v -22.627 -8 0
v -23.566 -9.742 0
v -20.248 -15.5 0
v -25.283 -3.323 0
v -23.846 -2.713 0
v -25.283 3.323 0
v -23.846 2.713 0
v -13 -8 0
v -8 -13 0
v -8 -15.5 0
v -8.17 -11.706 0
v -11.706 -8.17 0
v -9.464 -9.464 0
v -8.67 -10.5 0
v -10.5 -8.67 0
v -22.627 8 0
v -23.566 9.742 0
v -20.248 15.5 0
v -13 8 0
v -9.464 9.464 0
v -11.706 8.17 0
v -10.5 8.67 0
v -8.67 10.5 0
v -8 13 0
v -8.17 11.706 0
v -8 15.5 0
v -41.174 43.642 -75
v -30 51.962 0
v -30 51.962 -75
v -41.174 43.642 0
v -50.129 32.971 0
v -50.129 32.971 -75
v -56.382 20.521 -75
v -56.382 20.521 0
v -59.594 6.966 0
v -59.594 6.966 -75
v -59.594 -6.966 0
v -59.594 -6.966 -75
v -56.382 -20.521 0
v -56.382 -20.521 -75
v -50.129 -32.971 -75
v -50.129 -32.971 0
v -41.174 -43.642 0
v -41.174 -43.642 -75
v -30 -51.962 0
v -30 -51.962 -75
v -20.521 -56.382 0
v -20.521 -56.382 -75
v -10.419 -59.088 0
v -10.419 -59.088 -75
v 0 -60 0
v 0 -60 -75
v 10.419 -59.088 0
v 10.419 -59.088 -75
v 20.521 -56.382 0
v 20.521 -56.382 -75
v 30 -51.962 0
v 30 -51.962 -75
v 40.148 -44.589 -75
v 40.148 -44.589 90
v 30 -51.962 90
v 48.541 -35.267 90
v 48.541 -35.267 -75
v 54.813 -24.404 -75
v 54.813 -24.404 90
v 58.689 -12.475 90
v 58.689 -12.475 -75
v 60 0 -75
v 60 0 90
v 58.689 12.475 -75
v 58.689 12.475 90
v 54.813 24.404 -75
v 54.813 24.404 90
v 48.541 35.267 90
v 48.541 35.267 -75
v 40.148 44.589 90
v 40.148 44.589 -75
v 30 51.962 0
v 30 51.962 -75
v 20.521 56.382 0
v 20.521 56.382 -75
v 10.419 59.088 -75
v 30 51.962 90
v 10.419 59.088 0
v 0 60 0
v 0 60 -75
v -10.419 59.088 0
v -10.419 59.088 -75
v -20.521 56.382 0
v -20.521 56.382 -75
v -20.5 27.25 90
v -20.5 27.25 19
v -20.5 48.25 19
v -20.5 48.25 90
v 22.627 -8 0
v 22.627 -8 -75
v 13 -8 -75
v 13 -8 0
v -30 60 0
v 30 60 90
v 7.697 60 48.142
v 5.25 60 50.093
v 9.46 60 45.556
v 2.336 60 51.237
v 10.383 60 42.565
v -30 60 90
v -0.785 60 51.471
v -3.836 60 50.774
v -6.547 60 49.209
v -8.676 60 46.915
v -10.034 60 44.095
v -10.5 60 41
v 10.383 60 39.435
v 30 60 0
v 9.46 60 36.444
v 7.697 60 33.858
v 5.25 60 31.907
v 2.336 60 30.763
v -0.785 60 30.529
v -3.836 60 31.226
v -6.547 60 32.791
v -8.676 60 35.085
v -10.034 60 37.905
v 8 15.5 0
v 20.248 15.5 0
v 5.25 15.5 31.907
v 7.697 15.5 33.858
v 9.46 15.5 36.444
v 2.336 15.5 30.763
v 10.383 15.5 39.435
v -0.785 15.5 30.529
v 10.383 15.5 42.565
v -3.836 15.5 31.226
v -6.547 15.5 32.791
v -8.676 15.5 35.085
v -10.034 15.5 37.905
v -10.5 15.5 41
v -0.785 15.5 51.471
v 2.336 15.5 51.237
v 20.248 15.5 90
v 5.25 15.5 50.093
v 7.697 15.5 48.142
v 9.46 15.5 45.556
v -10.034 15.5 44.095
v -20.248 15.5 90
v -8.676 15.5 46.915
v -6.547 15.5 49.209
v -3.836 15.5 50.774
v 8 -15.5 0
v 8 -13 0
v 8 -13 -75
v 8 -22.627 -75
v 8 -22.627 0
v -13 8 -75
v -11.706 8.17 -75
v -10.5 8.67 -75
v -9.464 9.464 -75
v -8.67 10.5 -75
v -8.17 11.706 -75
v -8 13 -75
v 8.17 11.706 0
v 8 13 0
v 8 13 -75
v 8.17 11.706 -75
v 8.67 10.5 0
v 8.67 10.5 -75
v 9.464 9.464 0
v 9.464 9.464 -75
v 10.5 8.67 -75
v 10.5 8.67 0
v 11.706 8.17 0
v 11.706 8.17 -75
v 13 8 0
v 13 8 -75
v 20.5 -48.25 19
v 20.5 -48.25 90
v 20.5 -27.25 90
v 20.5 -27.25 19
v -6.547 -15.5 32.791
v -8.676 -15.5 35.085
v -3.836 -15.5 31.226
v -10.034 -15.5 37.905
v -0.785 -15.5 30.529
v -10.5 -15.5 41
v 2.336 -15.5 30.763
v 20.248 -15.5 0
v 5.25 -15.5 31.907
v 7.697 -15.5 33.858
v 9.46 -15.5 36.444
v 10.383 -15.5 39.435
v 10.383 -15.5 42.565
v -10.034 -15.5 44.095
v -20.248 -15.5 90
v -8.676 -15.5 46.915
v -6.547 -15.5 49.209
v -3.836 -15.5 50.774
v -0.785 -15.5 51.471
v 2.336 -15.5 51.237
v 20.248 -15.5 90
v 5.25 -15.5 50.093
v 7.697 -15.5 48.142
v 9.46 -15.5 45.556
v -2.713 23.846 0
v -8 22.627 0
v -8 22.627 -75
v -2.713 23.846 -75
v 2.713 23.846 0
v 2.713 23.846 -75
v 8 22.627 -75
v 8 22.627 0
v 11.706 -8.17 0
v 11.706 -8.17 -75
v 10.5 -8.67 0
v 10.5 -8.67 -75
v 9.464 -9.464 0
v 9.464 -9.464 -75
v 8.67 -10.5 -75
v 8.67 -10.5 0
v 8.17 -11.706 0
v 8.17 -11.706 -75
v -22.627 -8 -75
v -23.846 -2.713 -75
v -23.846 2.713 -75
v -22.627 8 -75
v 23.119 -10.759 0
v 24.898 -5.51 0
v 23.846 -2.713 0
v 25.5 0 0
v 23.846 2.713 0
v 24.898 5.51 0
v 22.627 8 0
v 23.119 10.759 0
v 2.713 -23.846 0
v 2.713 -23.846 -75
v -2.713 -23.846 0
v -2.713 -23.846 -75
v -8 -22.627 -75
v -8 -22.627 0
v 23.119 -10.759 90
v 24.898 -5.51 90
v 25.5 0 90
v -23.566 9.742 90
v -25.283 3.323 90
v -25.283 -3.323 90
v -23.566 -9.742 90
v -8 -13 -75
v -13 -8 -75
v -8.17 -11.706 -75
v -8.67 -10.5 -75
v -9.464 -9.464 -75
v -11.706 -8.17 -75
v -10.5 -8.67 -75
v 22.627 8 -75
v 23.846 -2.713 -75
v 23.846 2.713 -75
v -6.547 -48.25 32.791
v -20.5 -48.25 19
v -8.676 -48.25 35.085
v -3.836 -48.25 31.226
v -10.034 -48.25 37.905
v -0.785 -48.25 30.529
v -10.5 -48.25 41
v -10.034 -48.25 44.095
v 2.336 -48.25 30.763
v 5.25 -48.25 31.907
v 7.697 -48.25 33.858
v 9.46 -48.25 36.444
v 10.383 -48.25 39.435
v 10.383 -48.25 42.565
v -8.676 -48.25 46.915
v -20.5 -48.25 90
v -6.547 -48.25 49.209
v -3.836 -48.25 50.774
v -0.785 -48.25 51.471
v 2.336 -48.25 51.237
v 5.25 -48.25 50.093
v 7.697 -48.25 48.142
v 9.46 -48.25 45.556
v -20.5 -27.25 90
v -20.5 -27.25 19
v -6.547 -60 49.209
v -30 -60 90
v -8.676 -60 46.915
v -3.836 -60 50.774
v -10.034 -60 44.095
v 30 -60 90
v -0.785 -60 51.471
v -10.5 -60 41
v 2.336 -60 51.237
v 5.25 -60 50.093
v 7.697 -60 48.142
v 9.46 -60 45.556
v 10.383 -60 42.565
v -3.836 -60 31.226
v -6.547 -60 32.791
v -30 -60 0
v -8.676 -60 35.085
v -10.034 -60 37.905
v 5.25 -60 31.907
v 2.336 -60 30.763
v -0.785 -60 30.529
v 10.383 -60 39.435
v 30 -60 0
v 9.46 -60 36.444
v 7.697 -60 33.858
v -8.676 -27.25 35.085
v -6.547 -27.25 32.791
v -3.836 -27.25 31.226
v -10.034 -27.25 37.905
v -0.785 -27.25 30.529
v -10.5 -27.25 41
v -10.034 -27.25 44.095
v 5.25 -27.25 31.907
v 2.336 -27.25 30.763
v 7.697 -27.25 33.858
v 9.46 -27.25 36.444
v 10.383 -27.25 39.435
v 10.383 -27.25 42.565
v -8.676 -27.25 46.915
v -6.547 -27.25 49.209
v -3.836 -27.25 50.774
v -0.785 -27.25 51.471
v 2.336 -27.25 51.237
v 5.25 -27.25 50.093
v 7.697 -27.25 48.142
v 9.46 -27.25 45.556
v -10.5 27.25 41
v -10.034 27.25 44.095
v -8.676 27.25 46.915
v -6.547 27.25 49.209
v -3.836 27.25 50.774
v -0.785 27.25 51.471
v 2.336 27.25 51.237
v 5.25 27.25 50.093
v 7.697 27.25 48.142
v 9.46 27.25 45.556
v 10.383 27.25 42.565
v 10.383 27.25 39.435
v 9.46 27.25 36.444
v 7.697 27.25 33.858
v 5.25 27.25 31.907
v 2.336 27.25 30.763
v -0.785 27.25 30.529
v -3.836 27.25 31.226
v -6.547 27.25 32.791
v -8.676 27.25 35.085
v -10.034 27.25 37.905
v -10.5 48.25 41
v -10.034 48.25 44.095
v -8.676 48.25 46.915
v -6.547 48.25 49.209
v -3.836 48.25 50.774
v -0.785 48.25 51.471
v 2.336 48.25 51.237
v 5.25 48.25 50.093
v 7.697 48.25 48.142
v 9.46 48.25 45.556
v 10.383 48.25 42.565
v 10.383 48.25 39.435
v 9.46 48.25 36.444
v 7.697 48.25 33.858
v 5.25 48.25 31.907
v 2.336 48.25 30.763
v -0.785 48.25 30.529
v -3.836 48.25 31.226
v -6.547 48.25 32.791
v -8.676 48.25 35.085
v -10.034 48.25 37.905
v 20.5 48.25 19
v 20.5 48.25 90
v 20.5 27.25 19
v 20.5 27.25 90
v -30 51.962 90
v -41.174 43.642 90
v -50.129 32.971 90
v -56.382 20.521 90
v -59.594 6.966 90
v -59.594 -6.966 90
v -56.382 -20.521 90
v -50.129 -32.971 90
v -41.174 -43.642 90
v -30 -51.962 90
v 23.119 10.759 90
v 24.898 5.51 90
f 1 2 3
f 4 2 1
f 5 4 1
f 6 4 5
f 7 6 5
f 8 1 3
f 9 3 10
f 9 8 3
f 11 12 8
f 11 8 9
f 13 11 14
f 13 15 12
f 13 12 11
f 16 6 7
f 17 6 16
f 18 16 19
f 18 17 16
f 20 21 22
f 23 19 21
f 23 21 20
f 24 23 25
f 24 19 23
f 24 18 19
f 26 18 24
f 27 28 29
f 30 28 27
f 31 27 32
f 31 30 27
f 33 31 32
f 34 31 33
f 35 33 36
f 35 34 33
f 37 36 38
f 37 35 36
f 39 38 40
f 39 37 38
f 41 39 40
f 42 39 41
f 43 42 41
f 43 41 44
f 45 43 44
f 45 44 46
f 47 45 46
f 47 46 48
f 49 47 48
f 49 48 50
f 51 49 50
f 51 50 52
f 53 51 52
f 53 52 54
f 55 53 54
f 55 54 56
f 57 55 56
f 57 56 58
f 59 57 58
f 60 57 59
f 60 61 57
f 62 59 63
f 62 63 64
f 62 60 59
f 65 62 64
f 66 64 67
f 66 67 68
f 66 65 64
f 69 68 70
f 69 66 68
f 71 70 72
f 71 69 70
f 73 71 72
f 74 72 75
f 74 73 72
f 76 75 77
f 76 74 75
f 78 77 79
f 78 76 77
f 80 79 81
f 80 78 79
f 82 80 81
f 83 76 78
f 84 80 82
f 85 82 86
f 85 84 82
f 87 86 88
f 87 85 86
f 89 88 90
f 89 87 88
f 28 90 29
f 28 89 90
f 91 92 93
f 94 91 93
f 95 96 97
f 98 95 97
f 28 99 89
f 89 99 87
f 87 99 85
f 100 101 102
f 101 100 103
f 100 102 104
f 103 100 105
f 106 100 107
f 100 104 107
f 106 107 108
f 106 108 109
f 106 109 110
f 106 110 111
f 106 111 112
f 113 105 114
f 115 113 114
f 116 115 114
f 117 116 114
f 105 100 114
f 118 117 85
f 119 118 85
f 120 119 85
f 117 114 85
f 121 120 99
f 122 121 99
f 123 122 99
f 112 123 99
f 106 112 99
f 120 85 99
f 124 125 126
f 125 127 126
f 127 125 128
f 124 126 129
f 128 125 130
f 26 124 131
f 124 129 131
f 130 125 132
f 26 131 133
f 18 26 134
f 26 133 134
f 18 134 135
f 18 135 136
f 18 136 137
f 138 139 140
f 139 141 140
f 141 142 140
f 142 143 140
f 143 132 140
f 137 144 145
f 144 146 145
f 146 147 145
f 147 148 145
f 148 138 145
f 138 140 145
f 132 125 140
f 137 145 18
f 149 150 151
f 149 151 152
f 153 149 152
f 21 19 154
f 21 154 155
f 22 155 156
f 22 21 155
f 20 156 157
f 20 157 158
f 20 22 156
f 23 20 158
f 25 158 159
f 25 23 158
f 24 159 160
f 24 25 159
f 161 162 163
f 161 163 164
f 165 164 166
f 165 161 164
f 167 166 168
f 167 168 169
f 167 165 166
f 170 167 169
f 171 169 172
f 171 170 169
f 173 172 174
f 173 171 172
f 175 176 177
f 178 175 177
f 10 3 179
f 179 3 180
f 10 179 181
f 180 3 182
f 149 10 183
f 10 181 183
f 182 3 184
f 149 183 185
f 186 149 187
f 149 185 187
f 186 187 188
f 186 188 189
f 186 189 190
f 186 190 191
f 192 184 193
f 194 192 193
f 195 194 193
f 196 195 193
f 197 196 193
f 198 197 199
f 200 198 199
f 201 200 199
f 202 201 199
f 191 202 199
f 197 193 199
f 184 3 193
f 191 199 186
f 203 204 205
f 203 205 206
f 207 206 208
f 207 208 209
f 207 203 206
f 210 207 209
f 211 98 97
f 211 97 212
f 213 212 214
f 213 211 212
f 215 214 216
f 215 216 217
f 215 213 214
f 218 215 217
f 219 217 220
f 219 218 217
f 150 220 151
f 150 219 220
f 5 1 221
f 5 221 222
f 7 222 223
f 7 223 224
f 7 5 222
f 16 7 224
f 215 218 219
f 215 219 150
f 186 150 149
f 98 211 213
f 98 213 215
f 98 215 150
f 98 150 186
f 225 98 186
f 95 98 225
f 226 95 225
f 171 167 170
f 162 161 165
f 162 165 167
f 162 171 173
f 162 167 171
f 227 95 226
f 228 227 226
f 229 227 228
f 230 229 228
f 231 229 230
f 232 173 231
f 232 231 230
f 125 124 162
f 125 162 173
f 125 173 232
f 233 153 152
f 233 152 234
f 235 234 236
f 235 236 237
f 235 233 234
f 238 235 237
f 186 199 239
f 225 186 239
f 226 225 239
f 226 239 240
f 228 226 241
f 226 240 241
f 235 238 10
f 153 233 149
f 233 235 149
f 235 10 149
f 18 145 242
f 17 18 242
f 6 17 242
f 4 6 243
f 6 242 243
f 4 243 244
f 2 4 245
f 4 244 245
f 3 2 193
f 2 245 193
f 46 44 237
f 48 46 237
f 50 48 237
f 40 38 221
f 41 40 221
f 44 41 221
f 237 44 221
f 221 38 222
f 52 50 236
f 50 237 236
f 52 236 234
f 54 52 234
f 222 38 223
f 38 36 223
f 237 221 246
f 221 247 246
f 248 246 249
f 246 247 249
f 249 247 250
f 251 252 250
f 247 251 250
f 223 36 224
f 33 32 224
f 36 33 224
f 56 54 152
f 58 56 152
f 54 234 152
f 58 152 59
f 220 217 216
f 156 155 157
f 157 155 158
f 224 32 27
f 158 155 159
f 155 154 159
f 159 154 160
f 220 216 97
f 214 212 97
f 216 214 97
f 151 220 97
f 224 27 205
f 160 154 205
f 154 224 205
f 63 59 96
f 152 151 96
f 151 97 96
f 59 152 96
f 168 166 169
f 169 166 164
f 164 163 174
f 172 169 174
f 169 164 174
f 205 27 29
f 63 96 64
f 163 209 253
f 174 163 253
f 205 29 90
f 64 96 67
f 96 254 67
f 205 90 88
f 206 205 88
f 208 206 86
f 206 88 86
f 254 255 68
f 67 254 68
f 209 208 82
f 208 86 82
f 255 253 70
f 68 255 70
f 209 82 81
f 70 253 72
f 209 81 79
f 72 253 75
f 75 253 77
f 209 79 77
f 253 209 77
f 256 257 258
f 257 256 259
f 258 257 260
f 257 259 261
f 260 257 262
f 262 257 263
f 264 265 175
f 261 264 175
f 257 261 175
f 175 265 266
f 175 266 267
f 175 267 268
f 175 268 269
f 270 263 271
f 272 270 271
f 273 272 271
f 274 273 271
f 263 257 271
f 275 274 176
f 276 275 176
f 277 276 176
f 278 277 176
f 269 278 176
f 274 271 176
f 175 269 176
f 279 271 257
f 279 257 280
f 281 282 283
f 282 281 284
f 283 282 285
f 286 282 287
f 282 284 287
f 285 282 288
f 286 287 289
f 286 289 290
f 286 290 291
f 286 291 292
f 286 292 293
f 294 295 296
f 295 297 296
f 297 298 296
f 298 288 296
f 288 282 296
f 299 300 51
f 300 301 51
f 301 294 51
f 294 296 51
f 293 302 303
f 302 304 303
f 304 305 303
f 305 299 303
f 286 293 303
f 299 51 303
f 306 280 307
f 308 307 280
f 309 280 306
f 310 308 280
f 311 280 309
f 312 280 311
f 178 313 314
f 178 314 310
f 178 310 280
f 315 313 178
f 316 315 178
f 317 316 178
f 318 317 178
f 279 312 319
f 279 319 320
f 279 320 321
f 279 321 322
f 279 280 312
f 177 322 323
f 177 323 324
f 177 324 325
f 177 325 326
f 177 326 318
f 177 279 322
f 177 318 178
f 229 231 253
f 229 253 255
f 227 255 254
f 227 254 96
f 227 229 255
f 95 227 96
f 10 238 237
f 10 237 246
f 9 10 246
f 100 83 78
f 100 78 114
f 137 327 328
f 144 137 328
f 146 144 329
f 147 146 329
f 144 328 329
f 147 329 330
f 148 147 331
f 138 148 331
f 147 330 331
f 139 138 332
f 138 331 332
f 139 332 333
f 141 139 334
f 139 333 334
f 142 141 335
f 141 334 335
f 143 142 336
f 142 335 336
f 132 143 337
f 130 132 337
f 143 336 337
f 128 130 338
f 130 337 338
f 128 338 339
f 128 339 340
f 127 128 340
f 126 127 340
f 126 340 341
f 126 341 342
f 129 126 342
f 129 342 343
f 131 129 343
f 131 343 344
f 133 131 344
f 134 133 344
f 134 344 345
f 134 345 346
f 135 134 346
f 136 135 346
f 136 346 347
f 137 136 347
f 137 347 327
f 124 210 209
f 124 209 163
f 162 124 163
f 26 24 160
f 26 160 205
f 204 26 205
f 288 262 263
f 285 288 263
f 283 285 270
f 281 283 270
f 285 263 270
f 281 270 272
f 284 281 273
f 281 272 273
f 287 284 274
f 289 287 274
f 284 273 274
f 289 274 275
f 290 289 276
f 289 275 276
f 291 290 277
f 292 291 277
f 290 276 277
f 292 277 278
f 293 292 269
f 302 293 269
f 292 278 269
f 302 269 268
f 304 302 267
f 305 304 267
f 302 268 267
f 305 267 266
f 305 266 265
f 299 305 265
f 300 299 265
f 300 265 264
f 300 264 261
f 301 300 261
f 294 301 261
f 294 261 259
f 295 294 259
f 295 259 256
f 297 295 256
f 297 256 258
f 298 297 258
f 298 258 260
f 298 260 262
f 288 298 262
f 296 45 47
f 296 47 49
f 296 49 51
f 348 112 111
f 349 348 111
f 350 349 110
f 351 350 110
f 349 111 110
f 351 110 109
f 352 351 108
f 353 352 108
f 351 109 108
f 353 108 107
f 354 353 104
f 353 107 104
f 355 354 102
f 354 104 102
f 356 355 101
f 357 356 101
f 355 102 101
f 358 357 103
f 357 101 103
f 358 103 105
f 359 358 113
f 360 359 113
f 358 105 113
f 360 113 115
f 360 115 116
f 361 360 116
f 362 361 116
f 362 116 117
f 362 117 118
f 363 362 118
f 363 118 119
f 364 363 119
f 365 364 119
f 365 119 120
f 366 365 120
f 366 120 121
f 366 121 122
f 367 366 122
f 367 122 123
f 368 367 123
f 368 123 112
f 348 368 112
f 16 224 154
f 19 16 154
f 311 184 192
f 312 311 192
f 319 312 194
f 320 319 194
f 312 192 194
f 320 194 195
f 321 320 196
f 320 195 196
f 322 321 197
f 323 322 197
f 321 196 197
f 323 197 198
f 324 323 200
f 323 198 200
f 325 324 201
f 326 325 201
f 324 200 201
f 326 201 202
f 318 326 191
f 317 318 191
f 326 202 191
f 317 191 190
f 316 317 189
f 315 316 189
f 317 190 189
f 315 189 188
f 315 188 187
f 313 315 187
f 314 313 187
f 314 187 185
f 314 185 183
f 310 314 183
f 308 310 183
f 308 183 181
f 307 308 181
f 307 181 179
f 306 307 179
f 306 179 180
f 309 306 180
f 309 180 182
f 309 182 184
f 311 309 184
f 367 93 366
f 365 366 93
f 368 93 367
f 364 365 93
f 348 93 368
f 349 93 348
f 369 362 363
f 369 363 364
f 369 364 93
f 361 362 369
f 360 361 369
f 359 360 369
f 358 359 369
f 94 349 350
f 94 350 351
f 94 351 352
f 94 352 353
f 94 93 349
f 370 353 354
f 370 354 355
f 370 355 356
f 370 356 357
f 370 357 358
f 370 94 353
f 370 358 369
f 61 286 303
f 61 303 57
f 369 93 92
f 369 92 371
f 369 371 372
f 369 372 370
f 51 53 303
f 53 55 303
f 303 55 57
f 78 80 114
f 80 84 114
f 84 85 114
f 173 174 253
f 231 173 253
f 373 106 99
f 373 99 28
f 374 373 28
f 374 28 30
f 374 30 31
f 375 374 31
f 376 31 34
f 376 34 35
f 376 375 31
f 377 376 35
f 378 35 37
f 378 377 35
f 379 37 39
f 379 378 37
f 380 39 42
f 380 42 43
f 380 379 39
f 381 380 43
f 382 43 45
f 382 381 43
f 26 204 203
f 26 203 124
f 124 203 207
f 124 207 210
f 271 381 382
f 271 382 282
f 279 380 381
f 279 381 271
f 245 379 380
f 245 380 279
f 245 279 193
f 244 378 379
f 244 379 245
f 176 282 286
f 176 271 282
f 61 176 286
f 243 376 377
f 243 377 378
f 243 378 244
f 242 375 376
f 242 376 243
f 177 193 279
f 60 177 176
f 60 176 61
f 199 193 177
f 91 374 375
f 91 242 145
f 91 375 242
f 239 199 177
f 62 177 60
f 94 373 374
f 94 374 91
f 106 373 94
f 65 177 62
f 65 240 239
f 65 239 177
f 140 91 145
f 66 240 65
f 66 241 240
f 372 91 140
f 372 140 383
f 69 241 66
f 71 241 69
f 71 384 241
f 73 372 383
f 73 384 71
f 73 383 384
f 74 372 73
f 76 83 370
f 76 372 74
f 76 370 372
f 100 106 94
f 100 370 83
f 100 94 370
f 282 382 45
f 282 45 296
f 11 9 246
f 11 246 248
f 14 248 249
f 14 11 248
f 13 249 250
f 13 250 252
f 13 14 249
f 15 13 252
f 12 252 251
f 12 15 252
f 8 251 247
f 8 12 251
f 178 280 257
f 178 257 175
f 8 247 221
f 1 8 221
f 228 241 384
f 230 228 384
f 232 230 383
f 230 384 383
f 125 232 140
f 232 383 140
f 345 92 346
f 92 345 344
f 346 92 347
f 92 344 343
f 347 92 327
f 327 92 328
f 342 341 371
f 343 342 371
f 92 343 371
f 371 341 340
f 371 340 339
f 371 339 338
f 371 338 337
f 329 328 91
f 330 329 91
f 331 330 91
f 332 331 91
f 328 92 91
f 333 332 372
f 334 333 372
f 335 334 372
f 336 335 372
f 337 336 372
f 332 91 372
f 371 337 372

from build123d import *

# Parameters (mm, degrees)
F1_DEPTH = 90
F2_DEPTH = 75
F4_DEPTH = 90
F6_W     = 41
F6_H     = 21
F7_DEPTH = 71
F8_R     = 10.5
F9_DEPTH = 200


# Not quite as in the source:
# - a feature names something its author has since deleted; it is built from what else it names


with BuildPart() as f1:
    # F0 (on Top) → F1 (new body)
    with BuildSketch(Plane.XY):
        with BuildLine():
            ThreePointArc((30, -51.9615242271), (51.9615242271, -30), (60, 0))
            ThreePointArc((60, 0), (51.9615242271, 30), (30, 51.9615242271))
            ThreePointArc((30, 51.9615242271), (15.5291427062, 57.9555495773), (0, 60))
            ThreePointArc((0, 60), (-15.5291427062, 57.9555495773), (-30, 51.9615242271))
            ThreePointArc((-30, 51.9615242271), (-60, 0), (-30, -51.9615242271))
            ThreePointArc((-30, -51.9615242271), (-15.5291427062, -57.9555495773), (0, -60))
            ThreePointArc((0, -60), (15.5291427062, -57.9555495773), (30, -51.9615242271))
        make_face()
        with BuildLine():
            ThreePointArc((-8, 22.627416998), (0, 24), (8, 22.627416998))
            Line((8, 22.627416998), (8, 13))
            ThreePointArc((8, 13), (9.4644660941, 9.4644660941), (13, 8))
            Line((13, 8), (22.627416998, 8))
            ThreePointArc((22.627416998, 8), (24, 0), (22.627416998, -8))
            Line((22.627416998, -8), (13, -8))
            ThreePointArc((13, -8), (9.4644660941, -9.4644660941), (8, -13))
            Line((8, -13), (8, -22.627416998))
            ThreePointArc((8, -22.627416998), (0, -24), (-8, -22.627416998))
            Line((-8, -22.627416998), (-8, -13))
            ThreePointArc((-8, -13), (-9.4644660941, -9.4644660941), (-13, -8))
            Line((-13, -8), (-22.627416998, -8))
            ThreePointArc((-22.627416998, -8), (-24, 0), (-22.627416998, 8))
            Line((-22.627416998, 8), (-13, 8))
            ThreePointArc((-13, 8), (-9.4644660941, 9.4644660941), (-8, 13))
            Line((-8, 13), (-8, 22.627416998))
        make_face(mode=Mode.SUBTRACT)
        with BuildLine():
            ThreePointArc((0, 60), (15.5291427062, 57.9555495773), (30, 51.9615242271))
            Line((30, 51.9615242271), (30, 60))
            Line((30, 60), (0, 60))
        make_face()
        with BuildLine():
            Line((30, -60), (30, -51.9615242271))
            ThreePointArc((30, -51.9615242271), (15.5291427062, -57.9555495773), (0, -60))
            Line((0, -60), (30, -60))
        make_face()
        with BuildLine():
            ThreePointArc((-30, 51.9615242271), (-15.5291427062, 57.9555495773), (0, 60))
            Line((0, 60), (-30, 60))
            Line((-30, 60), (-30, 51.9615242271))
        make_face()
        with BuildLine():
            Line((-30, -60), (0, -60))
            ThreePointArc((0, -60), (-15.5291427062, -57.9555495773), (-30, -51.9615242271))
            Line((-30, -51.9615242271), (-30, -60))
        make_face()
        with BuildLine():
            Line((8, 13), (8, 22.627416998))
            ThreePointArc((8, 22.627416998), (0, 24), (-8, 22.627416998))
            Line((-8, 22.627416998), (-8, 13))
            ThreePointArc((-8, 13), (-9.4644660941, 9.4644660941), (-13, 8))
            Line((-13, 8), (-22.627416998, 8))
            ThreePointArc((-22.627416998, 8), (-24, 0), (-22.627416998, -8))
            Line((-22.627416998, -8), (-13, -8))
            ThreePointArc((-13, -8), (-9.4644660941, -9.4644660941), (-8, -13))
            Line((-8, -13), (-8, -22.627416998))
            ThreePointArc((-8, -22.627416998), (0, -24), (8, -22.627416998))
            Line((8, -22.627416998), (8, -13))
            ThreePointArc((8, -13), (9.4644660941, -9.4644660941), (13, -8))
            Line((13, -8), (22.627416998, -8))
            ThreePointArc((22.627416998, -8), (24, 0), (22.627416998, 8))
            Line((22.627416998, 8), (13, 8))
            ThreePointArc((13, 8), (9.4644660941, 9.4644660941), (8, 13))
        make_face()
    extrude(amount=F1_DEPTH)

    # F0 (on Top) → F2 (join)
    with BuildSketch(Plane.XY):
        with BuildLine():
            ThreePointArc((30, -51.9615242271), (51.9615242271, -30), (60, 0))
            ThreePointArc((60, 0), (51.9615242271, 30), (30, 51.9615242271))
            ThreePointArc((30, 51.9615242271), (15.5291427062, 57.9555495773), (0, 60))
            ThreePointArc((0, 60), (-15.5291427062, 57.9555495773), (-30, 51.9615242271))
            ThreePointArc((-30, 51.9615242271), (-60, 0), (-30, -51.9615242271))
            ThreePointArc((-30, -51.9615242271), (-15.5291427062, -57.9555495773), (0, -60))
            ThreePointArc((0, -60), (15.5291427062, -57.9555495773), (30, -51.9615242271))
        make_face()
        with BuildLine():
            ThreePointArc((-8, 22.627416998), (0, 24), (8, 22.627416998))
            Line((8, 22.627416998), (8, 13))
            ThreePointArc((8, 13), (9.4644660941, 9.4644660941), (13, 8))
            Line((13, 8), (22.627416998, 8))
            ThreePointArc((22.627416998, 8), (24, 0), (22.627416998, -8))
            Line((22.627416998, -8), (13, -8))
            ThreePointArc((13, -8), (9.4644660941, -9.4644660941), (8, -13))
            Line((8, -13), (8, -22.627416998))
            ThreePointArc((8, -22.627416998), (0, -24), (-8, -22.627416998))
            Line((-8, -22.627416998), (-8, -13))
            ThreePointArc((-8, -13), (-9.4644660941, -9.4644660941), (-13, -8))
            Line((-13, -8), (-22.627416998, -8))
            ThreePointArc((-22.627416998, -8), (-24, 0), (-22.627416998, 8))
            Line((-22.627416998, 8), (-13, 8))
            ThreePointArc((-13, 8), (-9.4644660941, 9.4644660941), (-8, 13))
            Line((-8, 13), (-8, 22.627416998))
        make_face(mode=Mode.SUBTRACT)
    extrude(amount=-F2_DEPTH)

    # F3 (on face) → F4 (cut)
    with BuildSketch(Plane.XY.offset(90)):
        with BuildLine():
            ThreePointArc((20.2484567313, -15.5), (24.1514559256, -8.1827365029), (25.5, 0))
            ThreePointArc((25.5, 0), (24.1514559256, 8.1827365029), (20.2484567313, 15.5))
            Line((20.2484567313, 15.5), (-20.2484567313, 15.5))
            ThreePointArc((-20.2484567313, 15.5), (-25.5, 0), (-20.2484567313, -15.5))
            Line((-20.2484567313, -15.5), (20.2484567313, -15.5))
        make_face()
    extrude(amount=-F4_DEPTH, mode=Mode.SUBTRACT)

    # F6 (on face) → F7 (cut)
    with BuildSketch(Plane.XY.offset(90)):
        with Locations((0, 37.75)):
            Rectangle(F6_W, F6_H)
        with Locations((0, -37.75)):
            Rectangle(F6_W, F6_H)
    extrude(amount=-F7_DEPTH, mode=Mode.SUBTRACT)

    # F8 (on face) → F9 (cut)
    with BuildSketch(Plane(origin=(0, 60, 0), x_dir=(-1, 0, 0), z_dir=(0, 1, 0))):
        with Locations((0, 41)):
            Circle(F8_R)
    extrude(amount=-F9_DEPTH, mode=Mode.SUBTRACT)


solid = f1.part
